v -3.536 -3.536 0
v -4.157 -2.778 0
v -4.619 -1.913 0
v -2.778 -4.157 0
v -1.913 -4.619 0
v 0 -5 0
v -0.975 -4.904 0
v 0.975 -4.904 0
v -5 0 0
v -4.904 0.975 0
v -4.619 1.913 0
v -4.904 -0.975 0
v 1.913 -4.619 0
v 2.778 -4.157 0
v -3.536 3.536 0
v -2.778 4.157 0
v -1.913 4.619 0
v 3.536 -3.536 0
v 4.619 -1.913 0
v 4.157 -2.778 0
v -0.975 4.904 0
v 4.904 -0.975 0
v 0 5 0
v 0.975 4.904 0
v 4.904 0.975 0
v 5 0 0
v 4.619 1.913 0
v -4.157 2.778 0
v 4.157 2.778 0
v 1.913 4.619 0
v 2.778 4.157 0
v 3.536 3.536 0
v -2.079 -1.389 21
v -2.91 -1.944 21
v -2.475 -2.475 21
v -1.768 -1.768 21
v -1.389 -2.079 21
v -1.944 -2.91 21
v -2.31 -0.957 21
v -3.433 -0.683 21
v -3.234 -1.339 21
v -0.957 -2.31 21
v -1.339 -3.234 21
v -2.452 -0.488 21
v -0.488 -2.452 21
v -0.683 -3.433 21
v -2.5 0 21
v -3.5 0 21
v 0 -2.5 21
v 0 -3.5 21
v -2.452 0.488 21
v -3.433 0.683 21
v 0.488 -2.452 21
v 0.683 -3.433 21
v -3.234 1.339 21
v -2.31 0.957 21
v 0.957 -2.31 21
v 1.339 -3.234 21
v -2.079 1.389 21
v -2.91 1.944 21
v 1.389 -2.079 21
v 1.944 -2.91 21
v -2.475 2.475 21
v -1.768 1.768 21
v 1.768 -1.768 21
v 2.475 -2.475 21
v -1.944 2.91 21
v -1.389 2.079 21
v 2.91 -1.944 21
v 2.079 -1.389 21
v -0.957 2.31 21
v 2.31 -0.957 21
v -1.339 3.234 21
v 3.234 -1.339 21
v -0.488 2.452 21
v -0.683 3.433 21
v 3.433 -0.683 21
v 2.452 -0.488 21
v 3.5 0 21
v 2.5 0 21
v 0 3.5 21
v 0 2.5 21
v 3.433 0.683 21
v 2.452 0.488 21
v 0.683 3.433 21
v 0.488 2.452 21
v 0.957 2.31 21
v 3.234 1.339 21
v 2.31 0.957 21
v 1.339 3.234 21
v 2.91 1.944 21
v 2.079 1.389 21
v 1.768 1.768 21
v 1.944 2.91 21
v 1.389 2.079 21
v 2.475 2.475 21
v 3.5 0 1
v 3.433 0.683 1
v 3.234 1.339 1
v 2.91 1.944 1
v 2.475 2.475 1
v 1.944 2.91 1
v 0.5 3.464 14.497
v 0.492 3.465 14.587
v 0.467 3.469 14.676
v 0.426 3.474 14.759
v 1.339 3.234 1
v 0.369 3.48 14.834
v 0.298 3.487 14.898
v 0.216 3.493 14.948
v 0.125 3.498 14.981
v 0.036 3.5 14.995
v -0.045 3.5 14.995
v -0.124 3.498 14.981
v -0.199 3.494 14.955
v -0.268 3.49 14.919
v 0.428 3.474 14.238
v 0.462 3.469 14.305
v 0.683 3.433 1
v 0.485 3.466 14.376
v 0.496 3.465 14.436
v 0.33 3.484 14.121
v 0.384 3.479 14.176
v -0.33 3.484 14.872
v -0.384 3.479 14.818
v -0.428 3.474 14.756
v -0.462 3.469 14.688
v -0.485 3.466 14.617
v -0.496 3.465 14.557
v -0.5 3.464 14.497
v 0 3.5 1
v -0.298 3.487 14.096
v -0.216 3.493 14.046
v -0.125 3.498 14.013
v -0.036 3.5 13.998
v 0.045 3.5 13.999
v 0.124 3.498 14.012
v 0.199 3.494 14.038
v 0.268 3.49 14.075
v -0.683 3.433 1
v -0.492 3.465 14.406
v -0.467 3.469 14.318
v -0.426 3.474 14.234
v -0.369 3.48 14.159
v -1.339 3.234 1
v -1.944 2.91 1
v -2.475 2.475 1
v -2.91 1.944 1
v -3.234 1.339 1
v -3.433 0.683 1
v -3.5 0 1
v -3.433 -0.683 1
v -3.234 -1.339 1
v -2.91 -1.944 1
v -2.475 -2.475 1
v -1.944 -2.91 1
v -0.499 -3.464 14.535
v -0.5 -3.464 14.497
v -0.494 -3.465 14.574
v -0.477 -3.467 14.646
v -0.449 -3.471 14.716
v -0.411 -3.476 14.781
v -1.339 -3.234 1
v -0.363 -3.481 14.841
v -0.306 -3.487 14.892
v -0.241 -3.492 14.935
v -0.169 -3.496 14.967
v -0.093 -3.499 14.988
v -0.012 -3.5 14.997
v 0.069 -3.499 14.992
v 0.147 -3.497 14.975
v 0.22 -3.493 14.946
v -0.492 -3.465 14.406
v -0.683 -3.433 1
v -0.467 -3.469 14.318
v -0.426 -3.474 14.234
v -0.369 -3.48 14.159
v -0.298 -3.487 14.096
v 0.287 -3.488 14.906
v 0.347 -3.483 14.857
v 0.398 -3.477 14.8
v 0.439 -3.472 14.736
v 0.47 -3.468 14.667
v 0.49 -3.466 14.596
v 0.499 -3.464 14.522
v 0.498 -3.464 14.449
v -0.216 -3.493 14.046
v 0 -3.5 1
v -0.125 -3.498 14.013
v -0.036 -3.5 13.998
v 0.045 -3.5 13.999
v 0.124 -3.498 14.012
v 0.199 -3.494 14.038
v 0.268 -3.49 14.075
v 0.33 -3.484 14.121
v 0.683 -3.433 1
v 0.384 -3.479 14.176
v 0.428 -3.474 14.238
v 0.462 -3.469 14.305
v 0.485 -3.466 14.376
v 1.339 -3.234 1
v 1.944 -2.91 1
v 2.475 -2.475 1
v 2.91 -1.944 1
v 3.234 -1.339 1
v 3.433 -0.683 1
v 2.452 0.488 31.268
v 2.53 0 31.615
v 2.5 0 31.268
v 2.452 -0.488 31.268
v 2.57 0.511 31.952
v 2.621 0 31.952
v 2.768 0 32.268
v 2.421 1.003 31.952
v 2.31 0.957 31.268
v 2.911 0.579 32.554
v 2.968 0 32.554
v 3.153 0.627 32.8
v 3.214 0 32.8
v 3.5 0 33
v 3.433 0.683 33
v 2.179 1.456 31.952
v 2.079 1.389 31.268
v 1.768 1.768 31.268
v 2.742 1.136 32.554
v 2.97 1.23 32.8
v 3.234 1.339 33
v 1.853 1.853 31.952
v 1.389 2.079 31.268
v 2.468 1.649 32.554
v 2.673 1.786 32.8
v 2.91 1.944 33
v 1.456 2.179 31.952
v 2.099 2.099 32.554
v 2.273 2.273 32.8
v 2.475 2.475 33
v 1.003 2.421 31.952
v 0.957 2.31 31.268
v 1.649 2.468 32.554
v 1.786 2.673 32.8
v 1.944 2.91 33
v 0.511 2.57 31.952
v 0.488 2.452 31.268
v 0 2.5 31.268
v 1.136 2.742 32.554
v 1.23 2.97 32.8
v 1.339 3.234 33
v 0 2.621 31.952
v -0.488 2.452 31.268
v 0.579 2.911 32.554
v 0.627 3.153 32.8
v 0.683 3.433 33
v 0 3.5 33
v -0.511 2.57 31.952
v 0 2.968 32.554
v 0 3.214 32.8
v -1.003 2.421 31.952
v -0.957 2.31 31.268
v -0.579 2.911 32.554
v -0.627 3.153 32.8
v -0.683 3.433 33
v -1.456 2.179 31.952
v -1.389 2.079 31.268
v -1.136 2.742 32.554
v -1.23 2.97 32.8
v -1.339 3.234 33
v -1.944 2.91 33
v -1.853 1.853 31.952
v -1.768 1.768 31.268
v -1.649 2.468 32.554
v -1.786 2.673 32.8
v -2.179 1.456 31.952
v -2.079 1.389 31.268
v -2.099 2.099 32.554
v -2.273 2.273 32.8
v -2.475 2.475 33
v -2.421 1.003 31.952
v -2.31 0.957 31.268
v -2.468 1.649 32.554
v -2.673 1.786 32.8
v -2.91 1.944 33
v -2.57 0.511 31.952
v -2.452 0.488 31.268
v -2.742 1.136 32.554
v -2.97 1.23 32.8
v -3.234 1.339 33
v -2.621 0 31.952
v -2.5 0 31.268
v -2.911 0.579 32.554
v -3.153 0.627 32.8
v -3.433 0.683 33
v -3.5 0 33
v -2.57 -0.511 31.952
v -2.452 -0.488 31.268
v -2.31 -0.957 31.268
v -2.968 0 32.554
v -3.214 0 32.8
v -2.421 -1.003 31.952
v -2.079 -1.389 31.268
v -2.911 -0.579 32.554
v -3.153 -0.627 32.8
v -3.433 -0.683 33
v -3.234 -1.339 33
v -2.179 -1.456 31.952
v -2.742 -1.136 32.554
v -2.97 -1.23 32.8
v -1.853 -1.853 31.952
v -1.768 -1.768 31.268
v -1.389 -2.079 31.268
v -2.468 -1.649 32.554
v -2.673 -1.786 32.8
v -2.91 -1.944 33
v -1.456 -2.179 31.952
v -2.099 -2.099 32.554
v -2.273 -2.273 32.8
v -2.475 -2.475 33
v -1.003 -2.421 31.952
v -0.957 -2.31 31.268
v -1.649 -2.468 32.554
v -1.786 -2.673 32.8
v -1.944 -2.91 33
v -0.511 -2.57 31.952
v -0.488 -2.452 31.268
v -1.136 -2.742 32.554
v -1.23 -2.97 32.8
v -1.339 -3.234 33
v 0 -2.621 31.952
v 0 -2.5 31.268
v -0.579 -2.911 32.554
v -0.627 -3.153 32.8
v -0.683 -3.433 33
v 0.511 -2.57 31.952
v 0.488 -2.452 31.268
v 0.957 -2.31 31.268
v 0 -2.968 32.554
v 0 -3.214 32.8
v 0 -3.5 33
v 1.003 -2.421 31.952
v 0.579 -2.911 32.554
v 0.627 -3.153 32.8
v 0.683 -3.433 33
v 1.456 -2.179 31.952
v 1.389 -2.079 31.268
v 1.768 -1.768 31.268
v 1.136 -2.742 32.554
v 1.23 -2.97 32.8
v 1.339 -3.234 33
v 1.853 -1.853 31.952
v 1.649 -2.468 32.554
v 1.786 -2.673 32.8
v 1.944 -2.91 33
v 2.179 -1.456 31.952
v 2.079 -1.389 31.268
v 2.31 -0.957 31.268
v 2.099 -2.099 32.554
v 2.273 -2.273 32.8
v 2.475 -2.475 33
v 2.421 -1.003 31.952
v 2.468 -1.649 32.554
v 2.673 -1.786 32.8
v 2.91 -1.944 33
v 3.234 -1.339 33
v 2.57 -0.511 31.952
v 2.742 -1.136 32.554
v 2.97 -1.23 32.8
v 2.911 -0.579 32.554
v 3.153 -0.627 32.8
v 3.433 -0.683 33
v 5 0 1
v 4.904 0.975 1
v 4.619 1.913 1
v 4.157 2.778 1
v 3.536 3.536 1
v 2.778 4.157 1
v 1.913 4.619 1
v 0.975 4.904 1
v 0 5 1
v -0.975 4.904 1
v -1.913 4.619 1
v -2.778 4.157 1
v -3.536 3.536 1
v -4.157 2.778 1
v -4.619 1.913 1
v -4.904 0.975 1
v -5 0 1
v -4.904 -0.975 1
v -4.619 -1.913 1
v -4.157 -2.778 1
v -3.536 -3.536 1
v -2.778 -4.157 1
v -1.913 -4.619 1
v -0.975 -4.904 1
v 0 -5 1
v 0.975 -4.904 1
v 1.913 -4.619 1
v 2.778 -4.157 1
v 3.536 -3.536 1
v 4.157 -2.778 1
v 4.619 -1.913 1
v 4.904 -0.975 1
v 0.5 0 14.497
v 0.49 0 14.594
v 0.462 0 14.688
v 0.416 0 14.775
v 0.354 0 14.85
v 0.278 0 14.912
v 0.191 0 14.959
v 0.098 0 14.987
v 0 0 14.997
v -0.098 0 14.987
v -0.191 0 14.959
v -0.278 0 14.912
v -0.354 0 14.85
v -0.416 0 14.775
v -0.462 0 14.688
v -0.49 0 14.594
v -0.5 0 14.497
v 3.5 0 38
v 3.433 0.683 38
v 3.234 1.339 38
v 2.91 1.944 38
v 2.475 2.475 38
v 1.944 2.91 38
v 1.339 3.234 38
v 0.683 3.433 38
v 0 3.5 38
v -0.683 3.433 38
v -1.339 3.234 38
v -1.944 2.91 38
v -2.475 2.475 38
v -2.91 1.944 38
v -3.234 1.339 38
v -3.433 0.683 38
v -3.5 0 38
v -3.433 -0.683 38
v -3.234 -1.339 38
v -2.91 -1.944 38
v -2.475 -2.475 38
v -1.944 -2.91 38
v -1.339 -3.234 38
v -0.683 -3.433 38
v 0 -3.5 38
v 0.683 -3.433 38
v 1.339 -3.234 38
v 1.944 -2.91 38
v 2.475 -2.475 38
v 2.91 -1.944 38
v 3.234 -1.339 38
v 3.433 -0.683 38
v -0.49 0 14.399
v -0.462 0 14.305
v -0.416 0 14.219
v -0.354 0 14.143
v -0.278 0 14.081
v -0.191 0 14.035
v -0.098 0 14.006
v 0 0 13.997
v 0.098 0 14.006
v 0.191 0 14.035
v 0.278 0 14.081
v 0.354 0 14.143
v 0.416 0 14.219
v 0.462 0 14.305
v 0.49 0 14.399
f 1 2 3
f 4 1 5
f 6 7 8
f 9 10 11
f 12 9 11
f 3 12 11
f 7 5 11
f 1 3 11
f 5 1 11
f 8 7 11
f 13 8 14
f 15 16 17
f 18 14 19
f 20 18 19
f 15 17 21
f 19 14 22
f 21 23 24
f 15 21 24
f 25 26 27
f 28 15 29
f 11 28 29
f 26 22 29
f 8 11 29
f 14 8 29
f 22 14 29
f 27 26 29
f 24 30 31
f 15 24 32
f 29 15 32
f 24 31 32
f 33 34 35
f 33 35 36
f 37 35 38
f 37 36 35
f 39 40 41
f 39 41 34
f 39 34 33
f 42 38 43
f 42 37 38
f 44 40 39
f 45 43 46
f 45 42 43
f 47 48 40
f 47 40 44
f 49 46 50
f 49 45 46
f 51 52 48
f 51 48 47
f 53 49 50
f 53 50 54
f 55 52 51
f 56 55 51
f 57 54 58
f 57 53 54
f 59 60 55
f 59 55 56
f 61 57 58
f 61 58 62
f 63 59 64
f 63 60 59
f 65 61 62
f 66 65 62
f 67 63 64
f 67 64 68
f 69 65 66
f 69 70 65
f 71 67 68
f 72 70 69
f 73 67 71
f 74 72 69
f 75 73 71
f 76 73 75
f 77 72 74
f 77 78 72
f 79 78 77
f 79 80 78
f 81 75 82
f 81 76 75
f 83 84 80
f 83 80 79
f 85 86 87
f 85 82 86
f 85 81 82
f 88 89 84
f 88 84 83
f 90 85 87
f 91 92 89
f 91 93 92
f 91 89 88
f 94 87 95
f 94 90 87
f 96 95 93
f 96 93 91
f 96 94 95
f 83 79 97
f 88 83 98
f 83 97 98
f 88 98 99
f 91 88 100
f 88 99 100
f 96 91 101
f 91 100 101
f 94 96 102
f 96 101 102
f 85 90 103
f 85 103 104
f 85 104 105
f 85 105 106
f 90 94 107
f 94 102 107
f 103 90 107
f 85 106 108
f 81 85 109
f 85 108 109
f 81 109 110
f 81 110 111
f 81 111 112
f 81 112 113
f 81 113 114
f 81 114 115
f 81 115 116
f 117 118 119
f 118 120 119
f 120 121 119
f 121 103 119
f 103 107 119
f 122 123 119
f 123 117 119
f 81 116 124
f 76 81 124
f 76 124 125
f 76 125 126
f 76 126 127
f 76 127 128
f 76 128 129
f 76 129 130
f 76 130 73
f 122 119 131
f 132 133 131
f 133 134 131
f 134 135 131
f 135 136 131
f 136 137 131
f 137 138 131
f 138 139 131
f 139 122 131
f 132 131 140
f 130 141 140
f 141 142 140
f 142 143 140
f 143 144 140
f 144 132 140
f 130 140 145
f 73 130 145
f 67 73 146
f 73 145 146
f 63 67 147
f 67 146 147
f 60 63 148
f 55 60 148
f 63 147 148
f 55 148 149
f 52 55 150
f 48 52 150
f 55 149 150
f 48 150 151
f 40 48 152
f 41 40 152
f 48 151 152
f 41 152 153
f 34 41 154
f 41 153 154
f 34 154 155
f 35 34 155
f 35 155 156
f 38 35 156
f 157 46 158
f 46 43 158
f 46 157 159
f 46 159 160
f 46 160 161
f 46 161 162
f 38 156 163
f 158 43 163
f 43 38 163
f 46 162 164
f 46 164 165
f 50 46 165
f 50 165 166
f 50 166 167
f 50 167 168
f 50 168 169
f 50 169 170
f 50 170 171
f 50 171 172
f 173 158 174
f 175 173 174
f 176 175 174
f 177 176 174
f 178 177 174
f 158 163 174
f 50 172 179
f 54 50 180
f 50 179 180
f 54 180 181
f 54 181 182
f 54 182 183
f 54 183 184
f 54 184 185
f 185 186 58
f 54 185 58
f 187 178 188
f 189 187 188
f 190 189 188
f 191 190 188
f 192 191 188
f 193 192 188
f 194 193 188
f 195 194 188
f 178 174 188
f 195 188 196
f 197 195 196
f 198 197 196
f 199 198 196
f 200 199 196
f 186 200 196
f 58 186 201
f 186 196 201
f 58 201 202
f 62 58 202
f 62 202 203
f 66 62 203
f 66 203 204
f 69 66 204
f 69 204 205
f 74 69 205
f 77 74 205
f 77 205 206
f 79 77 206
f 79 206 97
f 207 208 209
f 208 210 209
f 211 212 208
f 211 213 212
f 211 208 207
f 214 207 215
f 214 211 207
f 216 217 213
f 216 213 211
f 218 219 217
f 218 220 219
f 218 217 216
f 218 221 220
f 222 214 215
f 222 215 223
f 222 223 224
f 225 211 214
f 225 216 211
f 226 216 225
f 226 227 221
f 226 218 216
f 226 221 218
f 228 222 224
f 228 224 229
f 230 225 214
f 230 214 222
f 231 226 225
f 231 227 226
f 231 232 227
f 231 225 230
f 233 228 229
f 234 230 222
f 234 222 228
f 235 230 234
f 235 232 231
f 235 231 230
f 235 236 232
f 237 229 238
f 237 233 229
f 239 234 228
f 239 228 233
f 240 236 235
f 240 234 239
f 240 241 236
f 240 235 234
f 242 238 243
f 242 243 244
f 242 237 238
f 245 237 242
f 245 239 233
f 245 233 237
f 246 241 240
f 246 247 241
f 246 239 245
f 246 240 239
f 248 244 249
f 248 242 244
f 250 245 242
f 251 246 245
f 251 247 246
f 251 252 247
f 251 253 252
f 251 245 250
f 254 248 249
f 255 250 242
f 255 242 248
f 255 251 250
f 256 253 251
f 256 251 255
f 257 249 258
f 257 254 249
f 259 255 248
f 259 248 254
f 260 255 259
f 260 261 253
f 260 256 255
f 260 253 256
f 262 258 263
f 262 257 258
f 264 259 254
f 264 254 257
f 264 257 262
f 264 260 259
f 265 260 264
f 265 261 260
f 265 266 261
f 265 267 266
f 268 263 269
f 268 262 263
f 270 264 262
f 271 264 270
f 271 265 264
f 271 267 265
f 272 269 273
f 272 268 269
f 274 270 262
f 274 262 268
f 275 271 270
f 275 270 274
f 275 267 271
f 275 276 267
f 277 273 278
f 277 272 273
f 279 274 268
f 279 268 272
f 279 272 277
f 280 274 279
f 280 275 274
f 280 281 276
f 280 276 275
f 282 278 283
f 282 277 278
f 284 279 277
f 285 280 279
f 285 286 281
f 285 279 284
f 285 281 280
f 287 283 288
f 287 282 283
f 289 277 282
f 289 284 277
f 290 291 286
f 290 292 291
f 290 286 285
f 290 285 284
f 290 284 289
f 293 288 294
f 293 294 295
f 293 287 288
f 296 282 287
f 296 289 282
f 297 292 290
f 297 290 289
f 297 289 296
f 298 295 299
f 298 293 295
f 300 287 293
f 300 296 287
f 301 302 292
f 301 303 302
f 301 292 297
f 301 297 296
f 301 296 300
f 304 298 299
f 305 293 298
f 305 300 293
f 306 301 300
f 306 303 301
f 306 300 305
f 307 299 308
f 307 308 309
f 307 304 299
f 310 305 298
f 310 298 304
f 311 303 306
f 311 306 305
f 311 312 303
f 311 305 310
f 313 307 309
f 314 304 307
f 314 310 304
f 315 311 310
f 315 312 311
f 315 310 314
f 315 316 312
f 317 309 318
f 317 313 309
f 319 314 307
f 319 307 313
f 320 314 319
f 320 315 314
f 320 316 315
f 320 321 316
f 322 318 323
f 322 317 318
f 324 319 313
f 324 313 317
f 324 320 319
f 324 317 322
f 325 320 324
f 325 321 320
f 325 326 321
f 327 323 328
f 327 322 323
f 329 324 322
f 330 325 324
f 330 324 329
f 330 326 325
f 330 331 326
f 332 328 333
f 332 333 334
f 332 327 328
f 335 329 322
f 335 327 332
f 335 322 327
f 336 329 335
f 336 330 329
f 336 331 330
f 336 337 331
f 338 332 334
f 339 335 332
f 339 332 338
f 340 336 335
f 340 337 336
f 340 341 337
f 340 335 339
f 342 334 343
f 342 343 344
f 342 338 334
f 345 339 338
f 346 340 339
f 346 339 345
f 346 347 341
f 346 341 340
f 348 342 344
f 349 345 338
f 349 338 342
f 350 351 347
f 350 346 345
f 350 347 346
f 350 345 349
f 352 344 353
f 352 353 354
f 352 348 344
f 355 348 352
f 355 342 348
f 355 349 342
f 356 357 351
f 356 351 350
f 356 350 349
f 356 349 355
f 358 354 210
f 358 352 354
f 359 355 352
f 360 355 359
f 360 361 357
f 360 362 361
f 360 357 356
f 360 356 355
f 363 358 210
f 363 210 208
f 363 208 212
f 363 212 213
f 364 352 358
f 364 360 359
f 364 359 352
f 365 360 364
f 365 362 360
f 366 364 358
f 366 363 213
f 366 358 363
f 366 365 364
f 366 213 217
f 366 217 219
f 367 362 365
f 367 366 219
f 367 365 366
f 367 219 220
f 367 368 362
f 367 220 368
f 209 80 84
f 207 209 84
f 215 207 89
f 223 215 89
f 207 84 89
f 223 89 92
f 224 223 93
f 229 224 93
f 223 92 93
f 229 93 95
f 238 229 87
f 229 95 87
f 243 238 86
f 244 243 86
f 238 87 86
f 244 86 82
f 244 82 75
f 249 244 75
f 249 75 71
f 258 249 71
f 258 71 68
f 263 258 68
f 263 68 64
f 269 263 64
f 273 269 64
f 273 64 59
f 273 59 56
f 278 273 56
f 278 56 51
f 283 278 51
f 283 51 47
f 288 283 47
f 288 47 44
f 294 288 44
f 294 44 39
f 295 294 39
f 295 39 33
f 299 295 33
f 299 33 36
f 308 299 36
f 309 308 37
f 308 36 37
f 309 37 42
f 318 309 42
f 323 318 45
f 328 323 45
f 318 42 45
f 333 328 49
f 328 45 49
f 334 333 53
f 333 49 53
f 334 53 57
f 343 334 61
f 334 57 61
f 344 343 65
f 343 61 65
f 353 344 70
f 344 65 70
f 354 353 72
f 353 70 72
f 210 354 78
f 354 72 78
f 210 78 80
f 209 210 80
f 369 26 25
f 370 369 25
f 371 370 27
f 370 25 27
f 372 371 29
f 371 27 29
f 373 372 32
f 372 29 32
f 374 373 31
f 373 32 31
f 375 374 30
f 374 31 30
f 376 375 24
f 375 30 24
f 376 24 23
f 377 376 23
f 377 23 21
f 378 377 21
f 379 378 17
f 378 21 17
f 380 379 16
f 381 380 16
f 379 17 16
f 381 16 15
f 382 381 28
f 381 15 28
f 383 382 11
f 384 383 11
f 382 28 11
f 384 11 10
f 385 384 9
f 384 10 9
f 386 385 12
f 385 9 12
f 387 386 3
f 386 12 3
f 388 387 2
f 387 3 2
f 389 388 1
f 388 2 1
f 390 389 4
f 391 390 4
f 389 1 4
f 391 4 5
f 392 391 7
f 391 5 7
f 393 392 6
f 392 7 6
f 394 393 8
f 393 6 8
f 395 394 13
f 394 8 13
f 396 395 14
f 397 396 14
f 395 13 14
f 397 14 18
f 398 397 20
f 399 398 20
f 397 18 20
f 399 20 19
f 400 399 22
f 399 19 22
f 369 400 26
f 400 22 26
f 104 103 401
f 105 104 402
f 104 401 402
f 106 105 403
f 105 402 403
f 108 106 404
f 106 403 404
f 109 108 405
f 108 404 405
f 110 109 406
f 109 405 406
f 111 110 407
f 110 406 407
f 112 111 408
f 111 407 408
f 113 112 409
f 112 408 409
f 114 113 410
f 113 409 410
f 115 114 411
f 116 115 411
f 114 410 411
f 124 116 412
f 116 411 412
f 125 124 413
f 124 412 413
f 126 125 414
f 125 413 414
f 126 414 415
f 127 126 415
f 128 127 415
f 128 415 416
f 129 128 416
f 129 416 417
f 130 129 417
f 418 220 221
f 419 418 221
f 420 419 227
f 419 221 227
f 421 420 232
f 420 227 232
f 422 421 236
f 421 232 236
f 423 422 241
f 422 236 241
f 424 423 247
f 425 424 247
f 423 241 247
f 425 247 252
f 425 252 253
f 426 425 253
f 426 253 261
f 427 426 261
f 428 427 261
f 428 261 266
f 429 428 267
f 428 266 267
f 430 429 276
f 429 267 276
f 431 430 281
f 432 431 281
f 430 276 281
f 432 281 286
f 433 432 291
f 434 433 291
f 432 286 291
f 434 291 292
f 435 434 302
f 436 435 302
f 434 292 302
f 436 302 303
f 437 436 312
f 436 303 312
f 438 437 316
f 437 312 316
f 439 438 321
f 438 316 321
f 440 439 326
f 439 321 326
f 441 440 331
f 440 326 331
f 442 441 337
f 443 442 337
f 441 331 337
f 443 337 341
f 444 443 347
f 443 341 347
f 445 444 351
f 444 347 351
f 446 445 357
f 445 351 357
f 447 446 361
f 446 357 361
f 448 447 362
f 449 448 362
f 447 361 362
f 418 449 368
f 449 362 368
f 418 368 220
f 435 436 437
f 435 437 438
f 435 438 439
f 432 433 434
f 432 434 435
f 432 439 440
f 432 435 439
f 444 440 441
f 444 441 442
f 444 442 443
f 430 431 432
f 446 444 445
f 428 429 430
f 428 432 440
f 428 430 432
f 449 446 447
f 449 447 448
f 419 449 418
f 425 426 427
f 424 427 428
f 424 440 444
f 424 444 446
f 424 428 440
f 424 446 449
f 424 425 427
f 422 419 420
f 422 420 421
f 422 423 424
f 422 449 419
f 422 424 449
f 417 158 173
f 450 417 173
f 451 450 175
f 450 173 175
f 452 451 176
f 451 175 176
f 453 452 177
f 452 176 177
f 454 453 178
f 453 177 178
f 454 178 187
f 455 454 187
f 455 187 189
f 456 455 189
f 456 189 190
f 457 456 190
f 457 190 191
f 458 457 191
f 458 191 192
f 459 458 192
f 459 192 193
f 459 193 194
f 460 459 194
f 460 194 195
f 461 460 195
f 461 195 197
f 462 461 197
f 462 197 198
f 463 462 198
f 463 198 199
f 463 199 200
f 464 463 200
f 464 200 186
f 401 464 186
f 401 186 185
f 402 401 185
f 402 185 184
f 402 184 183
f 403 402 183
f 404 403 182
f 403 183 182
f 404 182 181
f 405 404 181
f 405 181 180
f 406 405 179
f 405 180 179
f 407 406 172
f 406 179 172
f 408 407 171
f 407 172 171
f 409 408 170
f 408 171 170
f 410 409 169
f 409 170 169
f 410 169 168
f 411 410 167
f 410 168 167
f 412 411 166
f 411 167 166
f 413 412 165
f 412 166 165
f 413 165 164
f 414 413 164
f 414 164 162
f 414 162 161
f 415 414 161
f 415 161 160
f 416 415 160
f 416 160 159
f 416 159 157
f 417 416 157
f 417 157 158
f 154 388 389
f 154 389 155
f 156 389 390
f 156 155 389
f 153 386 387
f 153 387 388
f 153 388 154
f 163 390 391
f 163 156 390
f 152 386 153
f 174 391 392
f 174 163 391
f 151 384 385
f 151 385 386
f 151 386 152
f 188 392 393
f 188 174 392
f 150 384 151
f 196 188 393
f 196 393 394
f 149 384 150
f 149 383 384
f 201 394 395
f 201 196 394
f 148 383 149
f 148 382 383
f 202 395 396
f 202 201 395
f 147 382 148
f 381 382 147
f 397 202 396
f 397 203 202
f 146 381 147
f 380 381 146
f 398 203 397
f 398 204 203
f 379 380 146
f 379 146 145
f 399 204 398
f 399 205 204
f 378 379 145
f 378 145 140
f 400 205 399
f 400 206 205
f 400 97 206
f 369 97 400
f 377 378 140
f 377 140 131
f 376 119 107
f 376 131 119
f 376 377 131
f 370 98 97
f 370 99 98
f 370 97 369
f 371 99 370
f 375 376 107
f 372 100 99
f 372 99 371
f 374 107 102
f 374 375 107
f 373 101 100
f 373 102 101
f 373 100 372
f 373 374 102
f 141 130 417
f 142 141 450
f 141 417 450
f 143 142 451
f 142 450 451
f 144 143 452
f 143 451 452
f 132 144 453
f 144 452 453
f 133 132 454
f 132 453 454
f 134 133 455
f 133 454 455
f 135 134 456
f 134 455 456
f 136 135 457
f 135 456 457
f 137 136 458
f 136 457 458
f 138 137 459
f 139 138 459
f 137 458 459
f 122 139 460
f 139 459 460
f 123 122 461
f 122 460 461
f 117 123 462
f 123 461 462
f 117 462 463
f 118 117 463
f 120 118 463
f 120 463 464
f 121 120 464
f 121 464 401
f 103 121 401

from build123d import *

# Parameters (mm, degrees)
F0_R     = 3.5
F1_DEPTH = 13
F7_R     = 3.5
F7_R_2   = 2.5
F8_DEPTH = 25
F9_START = 8
F9_DEPTH = 12
F0_R_2   = 5
F3_DEPTH = 1
F5_D     = 1
F5_DEPTH = 5.001
F6_D     = 1
F6_DEPTH = 12
F6_TIP   = 0.3004303095


# Not quite as in the source:
# - a fillet or chamfer that OpenCascade refuses, or shapes differently, is made with other operations: its cross-section is extruded or revolved along the edge and cut away or added


with BuildPart() as f1:
    # F0 (on Top) → F1 (new body)
    with BuildSketch(Plane.XY):
        Circle(F0_R)
    extrude(amount=F1_DEPTH)

    # F7 (on face) → F8 (join)
    with BuildSketch(Plane.XY.offset(13)):
        Circle(F7_R)
        Circle(F7_R_2, mode=Mode.SUBTRACT)
        Circle(F7_R_2)
    extrude(amount=F8_DEPTH)

    # F7 (on face) → F9 (cut)
    with BuildSketch(Plane.XY.offset(13).offset(F9_START)):
        Circle(F7_R)
        Circle(F7_R_2, mode=Mode.SUBTRACT)
    extrude(amount=F9_DEPTH, mode=Mode.SUBTRACT)

    # F2: fillet of radius 2 on 1 edges, made by hand

    # F2_s1 → F2_t2 (revolve)
    with BuildSketch(Plane.XZ):
        with BuildLine():
            ThreePointArc((2.5, 31.2679491924), (2.7679491924, 32.2679491924), (3.5, 33))
            Line((3.5, 33), (2.5, 33))
            Line((2.5, 33), (2.5, 31.2679491924))
        make_face()
    revolve(axis=Axis((0, 0, 33), (0, 0, 1)))

    # F0 (on Top) → F3 (join)
    with BuildSketch(Plane.XY):
        Circle(F0_R_2)
        Circle(F0_R, mode=Mode.SUBTRACT)
    extrude(amount=F3_DEPTH)

    # F5 (through all, one way)
    with BuildSketch(Plane.XZ):
        with Locations((0, 14.4967586048)):
            Circle(F5_D / 2)
    extrude(amount=-F5_DEPTH, mode=Mode.SUBTRACT)

    # F6
    with Locations(Plane(origin=(0, 0, 0), x_dir=(1, 0, 0), z_dir=(0, 1, 0))):
        with Locations((0, -14.4967586048)):
            Hole(F6_D / 2, depth=F6_DEPTH)
            with Locations((0, 0, -(F6_DEPTH + F6_TIP / 2))):  # 118° drill point
                Cone(0, F6_D / 2, F6_TIP, mode=Mode.SUBTRACT)


solid = f1.part
